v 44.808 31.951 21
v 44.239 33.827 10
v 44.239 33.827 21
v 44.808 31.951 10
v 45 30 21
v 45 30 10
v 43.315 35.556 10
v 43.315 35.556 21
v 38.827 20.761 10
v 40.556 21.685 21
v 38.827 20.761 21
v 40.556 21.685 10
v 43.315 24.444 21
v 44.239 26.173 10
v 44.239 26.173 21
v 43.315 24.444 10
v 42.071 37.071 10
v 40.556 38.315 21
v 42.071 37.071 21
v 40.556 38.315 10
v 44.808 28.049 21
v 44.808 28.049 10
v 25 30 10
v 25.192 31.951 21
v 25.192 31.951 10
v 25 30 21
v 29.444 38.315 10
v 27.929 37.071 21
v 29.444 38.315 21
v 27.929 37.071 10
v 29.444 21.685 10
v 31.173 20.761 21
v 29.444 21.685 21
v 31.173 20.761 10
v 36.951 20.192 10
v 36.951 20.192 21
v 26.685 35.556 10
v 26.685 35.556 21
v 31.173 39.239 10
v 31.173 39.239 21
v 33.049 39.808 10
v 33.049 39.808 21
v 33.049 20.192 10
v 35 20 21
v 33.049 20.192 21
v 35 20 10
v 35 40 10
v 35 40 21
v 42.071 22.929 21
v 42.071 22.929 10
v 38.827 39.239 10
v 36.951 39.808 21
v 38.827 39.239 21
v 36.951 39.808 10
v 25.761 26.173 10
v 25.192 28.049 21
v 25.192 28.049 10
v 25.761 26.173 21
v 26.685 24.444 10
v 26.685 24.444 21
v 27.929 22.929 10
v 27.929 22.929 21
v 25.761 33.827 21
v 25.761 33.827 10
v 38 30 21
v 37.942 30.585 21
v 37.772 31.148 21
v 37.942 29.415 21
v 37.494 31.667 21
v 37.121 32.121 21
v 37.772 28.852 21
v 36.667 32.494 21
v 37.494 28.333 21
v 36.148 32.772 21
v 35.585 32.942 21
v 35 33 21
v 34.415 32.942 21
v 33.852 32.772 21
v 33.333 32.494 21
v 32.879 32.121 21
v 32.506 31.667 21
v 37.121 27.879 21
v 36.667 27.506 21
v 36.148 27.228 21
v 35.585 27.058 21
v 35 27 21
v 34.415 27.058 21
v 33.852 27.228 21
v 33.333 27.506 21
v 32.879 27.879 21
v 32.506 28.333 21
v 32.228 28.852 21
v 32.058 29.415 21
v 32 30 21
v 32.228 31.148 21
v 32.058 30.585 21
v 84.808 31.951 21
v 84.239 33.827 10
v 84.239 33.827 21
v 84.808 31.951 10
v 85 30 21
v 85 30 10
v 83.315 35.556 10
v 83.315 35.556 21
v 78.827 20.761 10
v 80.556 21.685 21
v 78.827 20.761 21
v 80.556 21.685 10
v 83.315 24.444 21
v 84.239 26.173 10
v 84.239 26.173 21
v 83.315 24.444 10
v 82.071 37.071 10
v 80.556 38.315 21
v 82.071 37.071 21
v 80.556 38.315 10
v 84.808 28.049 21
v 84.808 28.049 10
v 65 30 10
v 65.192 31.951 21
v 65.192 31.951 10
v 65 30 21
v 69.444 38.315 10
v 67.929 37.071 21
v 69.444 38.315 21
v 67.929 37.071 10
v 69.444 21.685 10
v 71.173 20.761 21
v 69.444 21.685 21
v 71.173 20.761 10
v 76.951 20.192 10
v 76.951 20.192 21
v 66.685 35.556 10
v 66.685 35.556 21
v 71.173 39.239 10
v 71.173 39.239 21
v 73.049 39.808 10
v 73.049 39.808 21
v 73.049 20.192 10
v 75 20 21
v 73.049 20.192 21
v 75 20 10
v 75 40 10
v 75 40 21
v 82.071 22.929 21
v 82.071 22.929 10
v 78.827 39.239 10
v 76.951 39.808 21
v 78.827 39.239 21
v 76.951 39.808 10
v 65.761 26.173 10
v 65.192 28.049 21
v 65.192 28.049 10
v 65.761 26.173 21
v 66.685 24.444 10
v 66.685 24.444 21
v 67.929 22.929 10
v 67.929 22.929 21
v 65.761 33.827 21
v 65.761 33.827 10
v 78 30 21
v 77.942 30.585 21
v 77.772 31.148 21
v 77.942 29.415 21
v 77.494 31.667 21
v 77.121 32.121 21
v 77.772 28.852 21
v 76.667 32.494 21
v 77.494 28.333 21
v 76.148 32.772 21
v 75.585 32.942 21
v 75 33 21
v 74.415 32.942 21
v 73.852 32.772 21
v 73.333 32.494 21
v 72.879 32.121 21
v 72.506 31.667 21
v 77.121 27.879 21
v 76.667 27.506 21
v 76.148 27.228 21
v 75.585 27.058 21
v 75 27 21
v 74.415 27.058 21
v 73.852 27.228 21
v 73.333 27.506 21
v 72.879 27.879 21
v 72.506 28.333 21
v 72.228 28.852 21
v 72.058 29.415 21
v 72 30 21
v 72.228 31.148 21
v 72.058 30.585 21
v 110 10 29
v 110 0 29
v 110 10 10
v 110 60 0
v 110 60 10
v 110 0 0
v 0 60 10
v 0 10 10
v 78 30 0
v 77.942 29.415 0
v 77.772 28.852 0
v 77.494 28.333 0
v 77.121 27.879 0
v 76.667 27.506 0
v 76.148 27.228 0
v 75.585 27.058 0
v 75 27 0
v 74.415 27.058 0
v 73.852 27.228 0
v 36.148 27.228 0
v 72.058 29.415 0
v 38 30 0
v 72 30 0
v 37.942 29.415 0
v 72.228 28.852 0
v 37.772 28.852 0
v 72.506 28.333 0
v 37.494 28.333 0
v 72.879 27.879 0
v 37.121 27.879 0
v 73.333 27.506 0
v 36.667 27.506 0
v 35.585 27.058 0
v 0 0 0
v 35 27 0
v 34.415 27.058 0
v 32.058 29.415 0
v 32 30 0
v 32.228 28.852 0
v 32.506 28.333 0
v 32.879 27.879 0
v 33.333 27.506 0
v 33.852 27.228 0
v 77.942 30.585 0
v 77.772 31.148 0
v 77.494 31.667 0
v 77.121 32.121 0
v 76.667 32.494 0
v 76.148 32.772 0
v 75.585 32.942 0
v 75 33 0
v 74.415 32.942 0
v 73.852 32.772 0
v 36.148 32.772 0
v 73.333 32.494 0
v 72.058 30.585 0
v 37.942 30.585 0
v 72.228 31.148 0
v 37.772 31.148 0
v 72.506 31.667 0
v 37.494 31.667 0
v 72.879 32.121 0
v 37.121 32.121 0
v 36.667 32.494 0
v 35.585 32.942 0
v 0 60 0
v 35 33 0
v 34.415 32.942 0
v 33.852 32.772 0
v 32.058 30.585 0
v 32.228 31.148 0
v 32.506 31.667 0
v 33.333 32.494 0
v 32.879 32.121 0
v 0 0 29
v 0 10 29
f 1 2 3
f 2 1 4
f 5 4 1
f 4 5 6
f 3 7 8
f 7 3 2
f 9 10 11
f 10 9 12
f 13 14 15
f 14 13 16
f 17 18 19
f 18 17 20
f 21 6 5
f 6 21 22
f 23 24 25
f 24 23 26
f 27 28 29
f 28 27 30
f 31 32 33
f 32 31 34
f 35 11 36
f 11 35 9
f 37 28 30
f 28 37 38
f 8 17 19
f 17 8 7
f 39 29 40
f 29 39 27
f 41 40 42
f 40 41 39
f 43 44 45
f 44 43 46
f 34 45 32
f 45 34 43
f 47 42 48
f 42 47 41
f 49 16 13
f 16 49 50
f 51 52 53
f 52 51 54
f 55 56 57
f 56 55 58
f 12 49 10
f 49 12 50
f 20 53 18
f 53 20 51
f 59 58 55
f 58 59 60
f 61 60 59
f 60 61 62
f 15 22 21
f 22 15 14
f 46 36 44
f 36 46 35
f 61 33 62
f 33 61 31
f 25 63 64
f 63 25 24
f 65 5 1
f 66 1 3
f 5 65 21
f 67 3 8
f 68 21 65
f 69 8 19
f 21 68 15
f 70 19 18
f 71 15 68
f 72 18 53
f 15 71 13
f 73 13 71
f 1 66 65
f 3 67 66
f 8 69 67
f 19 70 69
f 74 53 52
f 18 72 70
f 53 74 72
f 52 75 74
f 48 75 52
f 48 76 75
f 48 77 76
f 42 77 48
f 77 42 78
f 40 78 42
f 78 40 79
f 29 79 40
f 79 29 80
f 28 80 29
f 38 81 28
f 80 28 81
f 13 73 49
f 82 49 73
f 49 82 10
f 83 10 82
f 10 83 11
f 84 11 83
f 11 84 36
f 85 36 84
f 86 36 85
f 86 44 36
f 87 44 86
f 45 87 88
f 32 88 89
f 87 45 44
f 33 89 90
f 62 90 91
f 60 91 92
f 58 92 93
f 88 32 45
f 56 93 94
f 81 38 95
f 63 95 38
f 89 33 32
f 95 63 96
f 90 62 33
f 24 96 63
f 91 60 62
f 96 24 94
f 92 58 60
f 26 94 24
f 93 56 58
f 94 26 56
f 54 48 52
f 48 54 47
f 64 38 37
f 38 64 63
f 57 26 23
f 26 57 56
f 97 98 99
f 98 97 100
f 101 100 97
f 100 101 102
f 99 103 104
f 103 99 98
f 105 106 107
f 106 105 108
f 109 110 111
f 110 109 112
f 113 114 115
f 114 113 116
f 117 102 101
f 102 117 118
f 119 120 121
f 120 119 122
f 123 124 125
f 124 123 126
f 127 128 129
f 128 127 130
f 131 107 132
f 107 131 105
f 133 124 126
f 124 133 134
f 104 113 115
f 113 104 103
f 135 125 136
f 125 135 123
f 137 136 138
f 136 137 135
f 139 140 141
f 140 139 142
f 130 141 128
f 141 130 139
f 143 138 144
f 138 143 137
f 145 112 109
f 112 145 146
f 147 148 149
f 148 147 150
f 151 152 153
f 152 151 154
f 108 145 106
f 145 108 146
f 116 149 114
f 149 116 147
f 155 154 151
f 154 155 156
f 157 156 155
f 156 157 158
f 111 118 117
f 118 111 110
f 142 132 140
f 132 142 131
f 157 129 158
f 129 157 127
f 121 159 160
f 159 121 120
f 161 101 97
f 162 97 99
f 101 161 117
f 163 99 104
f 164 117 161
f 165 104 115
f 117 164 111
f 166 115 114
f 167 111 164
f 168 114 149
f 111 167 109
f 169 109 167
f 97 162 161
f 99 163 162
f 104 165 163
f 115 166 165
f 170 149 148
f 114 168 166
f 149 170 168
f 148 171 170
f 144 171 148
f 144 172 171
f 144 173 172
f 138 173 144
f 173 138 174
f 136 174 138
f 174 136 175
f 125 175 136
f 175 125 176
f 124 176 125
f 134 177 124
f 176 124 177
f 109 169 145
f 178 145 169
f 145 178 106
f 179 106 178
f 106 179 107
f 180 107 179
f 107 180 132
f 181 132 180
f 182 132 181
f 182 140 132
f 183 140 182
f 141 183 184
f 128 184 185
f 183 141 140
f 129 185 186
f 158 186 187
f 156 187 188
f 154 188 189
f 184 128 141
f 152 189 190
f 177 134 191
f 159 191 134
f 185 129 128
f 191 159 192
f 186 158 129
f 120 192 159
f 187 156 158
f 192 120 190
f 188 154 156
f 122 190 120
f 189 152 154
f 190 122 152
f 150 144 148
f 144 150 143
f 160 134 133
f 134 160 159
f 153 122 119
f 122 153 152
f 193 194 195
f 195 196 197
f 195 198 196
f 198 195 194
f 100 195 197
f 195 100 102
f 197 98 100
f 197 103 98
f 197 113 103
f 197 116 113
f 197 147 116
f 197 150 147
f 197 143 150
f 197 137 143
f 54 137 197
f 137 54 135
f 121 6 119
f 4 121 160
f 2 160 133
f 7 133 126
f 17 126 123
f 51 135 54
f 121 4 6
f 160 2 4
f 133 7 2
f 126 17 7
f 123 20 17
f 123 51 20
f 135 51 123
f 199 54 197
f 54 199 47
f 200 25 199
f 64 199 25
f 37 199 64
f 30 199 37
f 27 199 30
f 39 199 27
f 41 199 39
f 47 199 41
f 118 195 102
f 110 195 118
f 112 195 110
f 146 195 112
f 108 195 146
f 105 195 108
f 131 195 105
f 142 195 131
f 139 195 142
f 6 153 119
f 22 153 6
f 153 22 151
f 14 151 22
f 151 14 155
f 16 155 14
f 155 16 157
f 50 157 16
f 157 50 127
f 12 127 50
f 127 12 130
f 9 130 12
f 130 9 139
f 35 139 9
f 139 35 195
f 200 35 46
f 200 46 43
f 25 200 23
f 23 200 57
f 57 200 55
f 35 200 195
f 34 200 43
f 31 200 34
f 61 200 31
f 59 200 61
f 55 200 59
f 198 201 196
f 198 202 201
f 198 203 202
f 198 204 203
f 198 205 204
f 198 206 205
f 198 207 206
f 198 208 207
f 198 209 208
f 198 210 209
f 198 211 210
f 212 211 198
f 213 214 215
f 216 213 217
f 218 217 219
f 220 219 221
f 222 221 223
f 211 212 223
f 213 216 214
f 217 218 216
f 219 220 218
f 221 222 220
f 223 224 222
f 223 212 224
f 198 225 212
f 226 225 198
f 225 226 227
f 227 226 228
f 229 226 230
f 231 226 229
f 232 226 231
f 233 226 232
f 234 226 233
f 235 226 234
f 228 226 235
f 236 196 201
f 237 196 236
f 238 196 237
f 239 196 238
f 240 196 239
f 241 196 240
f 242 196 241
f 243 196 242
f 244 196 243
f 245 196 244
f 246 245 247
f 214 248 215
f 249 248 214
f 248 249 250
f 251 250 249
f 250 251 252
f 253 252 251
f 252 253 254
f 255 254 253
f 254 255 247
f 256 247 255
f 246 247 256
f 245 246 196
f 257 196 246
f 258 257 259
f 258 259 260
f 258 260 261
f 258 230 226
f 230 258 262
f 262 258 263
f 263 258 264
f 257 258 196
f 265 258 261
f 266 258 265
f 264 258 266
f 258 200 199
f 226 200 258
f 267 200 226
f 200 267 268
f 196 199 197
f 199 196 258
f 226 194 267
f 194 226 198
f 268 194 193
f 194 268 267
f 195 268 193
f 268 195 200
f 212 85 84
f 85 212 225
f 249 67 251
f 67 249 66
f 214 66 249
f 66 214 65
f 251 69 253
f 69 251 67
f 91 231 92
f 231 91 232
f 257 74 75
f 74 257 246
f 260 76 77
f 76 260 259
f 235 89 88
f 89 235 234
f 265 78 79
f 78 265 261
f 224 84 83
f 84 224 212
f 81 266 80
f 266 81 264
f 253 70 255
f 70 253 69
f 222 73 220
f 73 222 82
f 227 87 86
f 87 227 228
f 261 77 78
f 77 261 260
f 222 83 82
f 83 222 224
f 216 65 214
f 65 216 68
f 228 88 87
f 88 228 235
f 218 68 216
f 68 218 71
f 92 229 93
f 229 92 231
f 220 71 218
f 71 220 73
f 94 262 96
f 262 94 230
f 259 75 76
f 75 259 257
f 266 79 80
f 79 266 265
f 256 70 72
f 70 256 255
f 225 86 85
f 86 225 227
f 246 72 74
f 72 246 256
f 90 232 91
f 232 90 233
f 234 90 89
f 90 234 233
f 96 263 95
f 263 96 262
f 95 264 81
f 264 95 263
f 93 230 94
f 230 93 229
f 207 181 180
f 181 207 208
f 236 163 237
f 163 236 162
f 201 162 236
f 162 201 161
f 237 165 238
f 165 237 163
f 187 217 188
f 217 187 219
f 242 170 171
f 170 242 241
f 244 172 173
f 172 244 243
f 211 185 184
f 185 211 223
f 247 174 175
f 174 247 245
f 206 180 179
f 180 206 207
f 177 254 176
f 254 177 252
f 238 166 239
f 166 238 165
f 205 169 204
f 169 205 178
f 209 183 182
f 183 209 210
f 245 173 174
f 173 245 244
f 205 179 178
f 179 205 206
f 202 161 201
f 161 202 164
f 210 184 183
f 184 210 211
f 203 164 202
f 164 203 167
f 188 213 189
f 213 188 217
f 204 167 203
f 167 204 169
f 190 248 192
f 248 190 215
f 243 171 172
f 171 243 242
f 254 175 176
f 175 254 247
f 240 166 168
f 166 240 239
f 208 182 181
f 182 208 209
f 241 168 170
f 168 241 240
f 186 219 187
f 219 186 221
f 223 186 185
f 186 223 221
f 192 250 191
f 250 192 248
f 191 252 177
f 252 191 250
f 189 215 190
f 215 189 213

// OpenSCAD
$fn = 32;

// ----------------------------------------------------------------------
// Drill jig: fence jig
// ----------------------------------------------------------------------

// --- parameters (mm) ---
plate_l = 110;            // plate length, X
plate_w = 60;             // plate width, Y
plate_t = 10;             // plate thickness
boss_d = 20;              // guide boss diameter
boss_h = 12;              // boss height above the plate
guide_d = 6;              // guide hole diameter
boss_pitch = 40;          // boss pitch
fence_h = 20;             // fence height above the plate
fence_t = 10;             // fence thickness

n_boss = 2;  // guide bosses
boss_x0 = (plate_l - (n_boss - 1) * boss_pitch) / 2;  // first boss X
boss_top = plate_t - 1 + boss_h;  // boss crown height
fence_top = plate_t - 1 + fence_h;  // fence crown height
total_h = max([fence_top, boss_top]);  // overall height

difference() {
  union() {
  cube([plate_l, plate_w, plate_t]);
  for (i = [0 : n_boss - 1])
    translate([boss_x0 + i * boss_pitch, plate_w / 2, plate_t - 1])
      cylinder(h = boss_h, d = boss_d);
  translate([0, 0, plate_t - 1]) cube([plate_l, fence_t, fence_h]);
  }
  for (i = [0 : n_boss - 1])
    translate([boss_x0 + i * boss_pitch, plate_w / 2, -1])
      cylinder(h = plate_t + boss_h, d = guide_d);
}
